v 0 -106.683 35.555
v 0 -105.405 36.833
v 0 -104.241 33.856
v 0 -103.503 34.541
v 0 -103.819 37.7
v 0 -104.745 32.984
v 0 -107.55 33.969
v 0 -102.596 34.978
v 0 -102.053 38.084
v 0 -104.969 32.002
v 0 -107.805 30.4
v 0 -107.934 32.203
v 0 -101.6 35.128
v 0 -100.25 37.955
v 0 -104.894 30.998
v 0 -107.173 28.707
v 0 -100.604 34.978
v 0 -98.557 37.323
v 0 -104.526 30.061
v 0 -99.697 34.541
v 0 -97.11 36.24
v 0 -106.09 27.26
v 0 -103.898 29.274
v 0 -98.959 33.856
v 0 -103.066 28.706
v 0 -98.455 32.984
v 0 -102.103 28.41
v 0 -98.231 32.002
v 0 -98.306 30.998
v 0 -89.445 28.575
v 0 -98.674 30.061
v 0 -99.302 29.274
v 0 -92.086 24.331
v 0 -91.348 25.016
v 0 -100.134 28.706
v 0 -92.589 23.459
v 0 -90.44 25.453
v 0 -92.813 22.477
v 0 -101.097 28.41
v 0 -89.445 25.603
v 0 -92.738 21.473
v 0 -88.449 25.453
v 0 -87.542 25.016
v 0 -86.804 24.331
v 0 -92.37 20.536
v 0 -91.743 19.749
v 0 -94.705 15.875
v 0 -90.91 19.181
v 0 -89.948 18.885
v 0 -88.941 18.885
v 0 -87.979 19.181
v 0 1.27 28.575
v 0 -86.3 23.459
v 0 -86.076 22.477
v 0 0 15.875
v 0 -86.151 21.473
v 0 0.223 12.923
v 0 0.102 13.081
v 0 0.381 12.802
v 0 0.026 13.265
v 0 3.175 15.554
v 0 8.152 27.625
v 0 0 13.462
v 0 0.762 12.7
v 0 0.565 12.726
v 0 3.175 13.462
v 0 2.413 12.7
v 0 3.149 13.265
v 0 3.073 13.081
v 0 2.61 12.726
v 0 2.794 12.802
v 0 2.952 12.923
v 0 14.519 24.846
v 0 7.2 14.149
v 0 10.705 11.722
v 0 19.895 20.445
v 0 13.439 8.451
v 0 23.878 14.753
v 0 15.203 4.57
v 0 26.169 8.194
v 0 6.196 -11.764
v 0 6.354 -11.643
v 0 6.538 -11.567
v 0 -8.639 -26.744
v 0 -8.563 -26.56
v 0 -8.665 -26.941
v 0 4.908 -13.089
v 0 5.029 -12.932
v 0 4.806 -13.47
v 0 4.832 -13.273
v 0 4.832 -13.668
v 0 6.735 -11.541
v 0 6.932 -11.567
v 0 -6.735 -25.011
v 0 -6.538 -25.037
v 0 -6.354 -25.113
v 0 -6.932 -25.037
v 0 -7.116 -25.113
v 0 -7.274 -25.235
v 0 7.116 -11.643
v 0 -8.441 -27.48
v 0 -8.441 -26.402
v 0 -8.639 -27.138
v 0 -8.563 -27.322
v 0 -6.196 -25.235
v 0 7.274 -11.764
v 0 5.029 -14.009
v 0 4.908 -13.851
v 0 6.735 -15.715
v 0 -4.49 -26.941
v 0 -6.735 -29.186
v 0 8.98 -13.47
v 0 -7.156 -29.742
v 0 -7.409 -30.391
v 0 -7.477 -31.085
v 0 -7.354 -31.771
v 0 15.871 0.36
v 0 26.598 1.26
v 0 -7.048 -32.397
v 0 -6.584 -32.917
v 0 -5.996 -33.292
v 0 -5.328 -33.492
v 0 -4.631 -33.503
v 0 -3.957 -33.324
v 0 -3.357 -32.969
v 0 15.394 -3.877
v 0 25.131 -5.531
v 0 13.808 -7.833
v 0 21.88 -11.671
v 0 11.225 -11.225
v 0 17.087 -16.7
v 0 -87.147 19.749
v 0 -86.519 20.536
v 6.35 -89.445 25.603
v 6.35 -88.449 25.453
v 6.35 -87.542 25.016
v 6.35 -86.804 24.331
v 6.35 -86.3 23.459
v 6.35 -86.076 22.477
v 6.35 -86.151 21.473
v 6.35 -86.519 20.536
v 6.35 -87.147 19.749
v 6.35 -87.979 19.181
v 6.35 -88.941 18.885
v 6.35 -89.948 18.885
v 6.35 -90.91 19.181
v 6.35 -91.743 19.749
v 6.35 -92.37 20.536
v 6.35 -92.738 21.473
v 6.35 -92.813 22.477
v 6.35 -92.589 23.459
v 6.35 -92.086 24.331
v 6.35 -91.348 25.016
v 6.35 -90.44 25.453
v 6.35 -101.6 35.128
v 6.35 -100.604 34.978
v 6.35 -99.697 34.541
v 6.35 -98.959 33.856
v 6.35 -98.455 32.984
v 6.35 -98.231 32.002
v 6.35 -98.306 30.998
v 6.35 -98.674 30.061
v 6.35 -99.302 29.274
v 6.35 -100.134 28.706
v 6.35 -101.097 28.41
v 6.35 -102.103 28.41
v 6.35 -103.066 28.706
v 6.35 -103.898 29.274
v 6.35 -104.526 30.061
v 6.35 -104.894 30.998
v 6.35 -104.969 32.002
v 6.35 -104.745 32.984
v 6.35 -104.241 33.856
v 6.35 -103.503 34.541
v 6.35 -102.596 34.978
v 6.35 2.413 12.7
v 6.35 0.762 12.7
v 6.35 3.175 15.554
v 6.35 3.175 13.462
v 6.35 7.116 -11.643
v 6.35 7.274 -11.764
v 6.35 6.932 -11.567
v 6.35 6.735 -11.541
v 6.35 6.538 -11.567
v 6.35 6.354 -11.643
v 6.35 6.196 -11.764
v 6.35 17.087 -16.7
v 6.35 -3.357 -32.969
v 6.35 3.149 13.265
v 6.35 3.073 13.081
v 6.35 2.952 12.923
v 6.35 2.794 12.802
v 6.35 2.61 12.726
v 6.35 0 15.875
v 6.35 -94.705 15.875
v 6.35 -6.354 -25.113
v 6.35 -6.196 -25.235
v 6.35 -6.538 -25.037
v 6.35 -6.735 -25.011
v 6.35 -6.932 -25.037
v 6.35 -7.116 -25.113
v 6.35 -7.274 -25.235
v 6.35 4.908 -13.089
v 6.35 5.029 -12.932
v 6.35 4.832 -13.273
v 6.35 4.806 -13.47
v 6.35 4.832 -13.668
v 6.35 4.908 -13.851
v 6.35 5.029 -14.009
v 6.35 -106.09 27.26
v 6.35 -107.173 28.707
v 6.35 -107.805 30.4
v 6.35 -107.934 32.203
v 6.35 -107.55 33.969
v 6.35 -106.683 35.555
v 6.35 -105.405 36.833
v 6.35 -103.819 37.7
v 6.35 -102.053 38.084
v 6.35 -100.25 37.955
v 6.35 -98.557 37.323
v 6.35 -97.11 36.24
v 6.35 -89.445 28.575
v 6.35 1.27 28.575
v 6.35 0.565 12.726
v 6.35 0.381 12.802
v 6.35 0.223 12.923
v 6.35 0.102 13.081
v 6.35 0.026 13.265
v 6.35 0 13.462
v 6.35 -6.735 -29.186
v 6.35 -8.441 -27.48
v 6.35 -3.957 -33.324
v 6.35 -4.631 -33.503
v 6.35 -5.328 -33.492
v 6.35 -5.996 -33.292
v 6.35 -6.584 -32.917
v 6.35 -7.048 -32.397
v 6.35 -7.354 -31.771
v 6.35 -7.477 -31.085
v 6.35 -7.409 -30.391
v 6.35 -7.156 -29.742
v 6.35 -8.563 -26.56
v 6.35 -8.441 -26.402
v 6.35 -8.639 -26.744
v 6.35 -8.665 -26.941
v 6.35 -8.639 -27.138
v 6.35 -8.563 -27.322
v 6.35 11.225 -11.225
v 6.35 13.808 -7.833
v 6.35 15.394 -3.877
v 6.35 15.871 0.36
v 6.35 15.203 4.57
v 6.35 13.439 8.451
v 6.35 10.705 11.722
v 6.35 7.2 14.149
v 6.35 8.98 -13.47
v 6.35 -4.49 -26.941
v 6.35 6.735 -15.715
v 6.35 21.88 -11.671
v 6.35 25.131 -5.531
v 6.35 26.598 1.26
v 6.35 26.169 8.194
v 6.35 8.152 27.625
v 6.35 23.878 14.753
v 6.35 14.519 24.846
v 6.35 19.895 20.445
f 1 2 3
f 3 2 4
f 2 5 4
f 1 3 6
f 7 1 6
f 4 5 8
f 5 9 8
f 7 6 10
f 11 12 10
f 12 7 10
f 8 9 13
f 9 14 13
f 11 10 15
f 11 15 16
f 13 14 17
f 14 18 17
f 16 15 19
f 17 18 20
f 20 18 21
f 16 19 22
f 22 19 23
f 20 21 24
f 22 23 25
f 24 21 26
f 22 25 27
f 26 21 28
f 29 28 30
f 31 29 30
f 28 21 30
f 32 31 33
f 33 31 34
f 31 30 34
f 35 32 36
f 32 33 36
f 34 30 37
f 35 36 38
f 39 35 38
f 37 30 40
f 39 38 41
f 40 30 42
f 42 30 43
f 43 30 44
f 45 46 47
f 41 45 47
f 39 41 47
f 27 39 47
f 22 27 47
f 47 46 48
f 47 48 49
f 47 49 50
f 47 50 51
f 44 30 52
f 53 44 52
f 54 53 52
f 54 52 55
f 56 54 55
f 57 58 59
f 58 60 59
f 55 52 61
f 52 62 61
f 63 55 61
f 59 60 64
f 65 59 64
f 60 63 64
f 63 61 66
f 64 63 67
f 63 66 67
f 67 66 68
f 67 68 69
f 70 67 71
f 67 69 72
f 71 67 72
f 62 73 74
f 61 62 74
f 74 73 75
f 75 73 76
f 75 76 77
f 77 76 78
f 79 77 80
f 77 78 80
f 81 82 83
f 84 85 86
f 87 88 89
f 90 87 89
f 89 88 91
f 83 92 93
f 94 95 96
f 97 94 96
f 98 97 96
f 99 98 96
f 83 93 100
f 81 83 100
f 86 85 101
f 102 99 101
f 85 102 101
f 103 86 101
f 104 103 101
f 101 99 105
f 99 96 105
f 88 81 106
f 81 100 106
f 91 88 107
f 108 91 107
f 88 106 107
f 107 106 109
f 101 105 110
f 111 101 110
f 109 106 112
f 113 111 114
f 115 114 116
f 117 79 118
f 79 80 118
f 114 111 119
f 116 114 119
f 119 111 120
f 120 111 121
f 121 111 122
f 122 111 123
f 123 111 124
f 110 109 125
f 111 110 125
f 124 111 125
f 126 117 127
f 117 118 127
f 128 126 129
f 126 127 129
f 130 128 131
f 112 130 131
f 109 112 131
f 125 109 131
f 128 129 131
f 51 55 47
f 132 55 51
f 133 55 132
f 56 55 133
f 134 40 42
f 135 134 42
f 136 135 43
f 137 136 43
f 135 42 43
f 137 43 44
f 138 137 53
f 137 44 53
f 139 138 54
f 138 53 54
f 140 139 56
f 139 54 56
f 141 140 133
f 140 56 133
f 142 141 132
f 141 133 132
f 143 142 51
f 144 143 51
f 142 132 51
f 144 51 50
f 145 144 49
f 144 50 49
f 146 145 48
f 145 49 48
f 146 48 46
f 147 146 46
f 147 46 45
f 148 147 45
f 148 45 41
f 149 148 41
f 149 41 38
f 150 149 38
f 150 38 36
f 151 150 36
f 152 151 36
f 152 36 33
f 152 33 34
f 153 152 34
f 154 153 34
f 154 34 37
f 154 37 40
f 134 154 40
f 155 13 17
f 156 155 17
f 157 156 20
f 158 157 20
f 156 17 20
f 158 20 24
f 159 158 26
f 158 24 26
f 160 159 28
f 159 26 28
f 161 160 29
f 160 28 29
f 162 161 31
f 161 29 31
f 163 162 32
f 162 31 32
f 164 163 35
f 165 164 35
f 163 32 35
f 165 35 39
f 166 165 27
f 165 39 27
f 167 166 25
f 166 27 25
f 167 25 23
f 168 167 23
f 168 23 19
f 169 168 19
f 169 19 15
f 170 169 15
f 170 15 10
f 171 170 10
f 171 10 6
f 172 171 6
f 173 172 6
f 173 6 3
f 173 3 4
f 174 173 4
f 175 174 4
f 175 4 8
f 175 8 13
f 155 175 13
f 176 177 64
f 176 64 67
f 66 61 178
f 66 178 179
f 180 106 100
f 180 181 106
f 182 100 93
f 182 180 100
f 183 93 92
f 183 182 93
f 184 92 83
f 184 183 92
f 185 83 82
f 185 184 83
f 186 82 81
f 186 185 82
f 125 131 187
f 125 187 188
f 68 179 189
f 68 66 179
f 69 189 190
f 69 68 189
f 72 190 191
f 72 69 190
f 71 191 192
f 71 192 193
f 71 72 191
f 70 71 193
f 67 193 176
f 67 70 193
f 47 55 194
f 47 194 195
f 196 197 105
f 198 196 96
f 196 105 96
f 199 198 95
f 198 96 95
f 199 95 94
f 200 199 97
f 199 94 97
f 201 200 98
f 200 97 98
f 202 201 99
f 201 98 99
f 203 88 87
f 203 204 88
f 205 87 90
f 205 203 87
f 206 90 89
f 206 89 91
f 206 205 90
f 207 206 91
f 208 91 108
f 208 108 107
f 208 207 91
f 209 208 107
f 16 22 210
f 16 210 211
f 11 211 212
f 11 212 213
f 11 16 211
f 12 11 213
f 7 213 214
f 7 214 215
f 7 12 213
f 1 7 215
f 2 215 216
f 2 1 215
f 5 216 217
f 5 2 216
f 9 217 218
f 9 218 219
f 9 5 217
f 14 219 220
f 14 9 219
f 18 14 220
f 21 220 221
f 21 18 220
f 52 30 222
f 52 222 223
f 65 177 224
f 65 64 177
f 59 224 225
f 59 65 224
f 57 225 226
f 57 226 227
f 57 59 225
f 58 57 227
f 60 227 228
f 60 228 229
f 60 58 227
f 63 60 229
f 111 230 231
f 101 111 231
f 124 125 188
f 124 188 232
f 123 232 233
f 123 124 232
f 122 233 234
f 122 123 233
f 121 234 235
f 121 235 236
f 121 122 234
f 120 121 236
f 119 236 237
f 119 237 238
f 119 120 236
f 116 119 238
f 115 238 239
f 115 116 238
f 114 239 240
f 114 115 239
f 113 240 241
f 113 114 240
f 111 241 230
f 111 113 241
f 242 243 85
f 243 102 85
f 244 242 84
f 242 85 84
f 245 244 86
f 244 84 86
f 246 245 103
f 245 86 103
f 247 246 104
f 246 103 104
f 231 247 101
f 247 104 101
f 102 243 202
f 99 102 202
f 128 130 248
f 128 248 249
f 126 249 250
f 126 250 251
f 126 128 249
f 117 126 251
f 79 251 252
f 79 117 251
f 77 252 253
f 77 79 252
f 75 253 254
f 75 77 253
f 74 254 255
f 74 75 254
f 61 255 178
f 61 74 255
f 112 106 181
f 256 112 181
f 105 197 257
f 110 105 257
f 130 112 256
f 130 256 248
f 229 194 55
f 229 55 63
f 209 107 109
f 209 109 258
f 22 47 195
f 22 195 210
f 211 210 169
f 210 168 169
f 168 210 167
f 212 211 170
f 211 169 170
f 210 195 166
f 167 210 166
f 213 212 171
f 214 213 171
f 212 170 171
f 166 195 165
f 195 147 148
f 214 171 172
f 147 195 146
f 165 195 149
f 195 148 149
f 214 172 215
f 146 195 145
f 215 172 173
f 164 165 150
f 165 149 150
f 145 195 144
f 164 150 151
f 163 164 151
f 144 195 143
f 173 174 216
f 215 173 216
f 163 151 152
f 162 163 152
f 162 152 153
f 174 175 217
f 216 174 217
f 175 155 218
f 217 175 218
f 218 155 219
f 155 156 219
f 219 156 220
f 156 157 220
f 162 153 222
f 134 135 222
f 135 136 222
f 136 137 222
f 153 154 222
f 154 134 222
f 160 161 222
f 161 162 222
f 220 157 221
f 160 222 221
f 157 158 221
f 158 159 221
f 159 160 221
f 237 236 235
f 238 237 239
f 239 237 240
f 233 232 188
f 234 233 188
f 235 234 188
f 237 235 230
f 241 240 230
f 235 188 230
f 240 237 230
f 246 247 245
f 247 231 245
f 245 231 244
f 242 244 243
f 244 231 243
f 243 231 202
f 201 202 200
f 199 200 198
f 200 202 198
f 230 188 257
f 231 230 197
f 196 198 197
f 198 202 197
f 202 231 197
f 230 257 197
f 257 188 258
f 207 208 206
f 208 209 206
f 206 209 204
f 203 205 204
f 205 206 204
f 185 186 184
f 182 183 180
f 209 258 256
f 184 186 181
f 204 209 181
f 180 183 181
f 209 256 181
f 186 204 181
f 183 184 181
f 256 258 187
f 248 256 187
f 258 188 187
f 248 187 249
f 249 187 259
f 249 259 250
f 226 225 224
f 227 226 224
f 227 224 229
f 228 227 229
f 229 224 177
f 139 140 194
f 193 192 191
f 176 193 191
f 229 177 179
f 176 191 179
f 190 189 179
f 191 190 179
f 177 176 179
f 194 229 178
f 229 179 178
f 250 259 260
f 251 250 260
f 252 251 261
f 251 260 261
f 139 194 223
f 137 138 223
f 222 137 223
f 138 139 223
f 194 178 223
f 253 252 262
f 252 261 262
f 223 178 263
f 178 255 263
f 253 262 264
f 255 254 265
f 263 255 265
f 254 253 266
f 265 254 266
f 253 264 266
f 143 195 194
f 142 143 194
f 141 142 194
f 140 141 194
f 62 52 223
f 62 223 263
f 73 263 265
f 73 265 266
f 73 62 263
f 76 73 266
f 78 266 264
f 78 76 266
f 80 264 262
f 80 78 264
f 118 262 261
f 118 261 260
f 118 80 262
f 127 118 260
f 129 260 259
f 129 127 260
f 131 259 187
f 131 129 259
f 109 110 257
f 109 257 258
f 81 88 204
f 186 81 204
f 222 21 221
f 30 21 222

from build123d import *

# Parameters (mm, degrees)
BOSS_EXTRUDE1_DEPTH         = 6.35
F_1_4_CLEARANCE_HOLE1_D     = 6.7564
F_1_4_CLEARANCE_HOLE1_DEPTH = 8.382
F_1_4_CLEARANCE_HOLE1_TIP   = 2.029827343
BOSS_EXTRUDE2_DEPTH         = 6.35
CRVPATTERN2_START           = 12.7
CRVPATTERN2_OUTLINE_W       = 6.35
CRVPATTERN2_OUTLINE_H       = 3.175
CRVPATTERN2_DEPTH           = 3.175
SKETCH5_W                   = 3.175
SKETCH5_H                   = 3.175
BOSS_EXTRUDE3_DEPTH         = 6.35
FILLET1_R                   = 0.762


# Read off the part's stored shape, not the designer's step: CrvPattern2
with BuildPart() as part:
    # Sketch1 → Boss-Extrude1 (new body)
    with BuildSketch(Plane(origin=(0, 0, 0), x_dir=(0, 0, -1), z_dir=(1, 0, 0))):
        with BuildLine():
            Line((-28.575, -89.444743879), (-28.575, 1.27))
            ThreePointArc((-28.575, 1.27), (-11.551976139, 25.24887134), (16.699509509, 17.086569533))
            Line((16.699509509, 17.086569533), (32.969334569, -3.357483913))
            ThreePointArc((32.969334569, -3.357483913), (32.673446977, -6.833926713), (29.185832393, -6.735192091))
            Line((29.185832393, -6.735192091), (11.225320151, 11.225320151))
            ThreePointArc((11.225320151, 11.225320151), (-6.075099489, 14.666587579), (-15.875, 0))
            Line((-15.875, 0), (-15.875, -94.705256121))
            Line((-15.875, -94.705256121), (-27.259871939, -106.090128061))
            ThreePointArc((-27.259871939, -106.090128061), (-36.240128061, -106.090128061), (-36.240128061, -97.109871939))
            Line((-36.240128061, -97.109871939), (-28.575, -89.444743879))
        make_face()
    extrude(amount=BOSS_EXTRUDE1_DEPTH)

    # 1/4 Clearance Hole1
    with Locations(Plane(origin=(6.35, 0, 0), x_dir=(0, 0, -1), z_dir=(1, 0, 0))):
        with Locations((-22.225, -89.444743879), (-31.75, -101.6)):
            Hole(F_1_4_CLEARANCE_HOLE1_D / 2, depth=F_1_4_CLEARANCE_HOLE1_DEPTH)
            with Locations((0, 0, -(F_1_4_CLEARANCE_HOLE1_DEPTH + F_1_4_CLEARANCE_HOLE1_TIP / 2))):  # 118° drill point
                Cone(0, F_1_4_CLEARANCE_HOLE1_D / 2, F_1_4_CLEARANCE_HOLE1_TIP, mode=Mode.SUBTRACT)

    # Sketch4 → Boss-Extrude2 (add)
    with BuildSketch(Plane(origin=(6.35, 0, 0), x_dir=(0, 0, -1), z_dir=(1, 0, 0))):
        Polygon((29.185832393, -6.735192091), (26.940768363, -8.980256121), (24.695704333, -6.735192091), (26.940768363, -4.490128061), align=None)
    extrude(amount=-BOSS_EXTRUDE2_DEPTH)

    # CrvPattern2 outline → CrvPattern2 (add)
    with BuildSketch(Plane(origin=(0, 0, 0), x_dir=(1, 0, 0), z_dir=(0, 0.7071067811865476, -0.7071067811865476)).offset(CRVPATTERN2_START)):
        with Locations((3.175, 4.7625)):
            Rectangle(CRVPATTERN2_OUTLINE_W, CRVPATTERN2_OUTLINE_H)
    extrude(amount=CRVPATTERN2_DEPTH)

    # Sketch5 → Boss-Extrude3 (add)
    with BuildSketch(Plane(origin=(6.35, 0, 0), x_dir=(0, 0, -1), z_dir=(1, 0, 0))):
        with Locations((-14.2875, 1.5875)):
            Rectangle(SKETCH5_W, SKETCH5_H)
    extrude(amount=-BOSS_EXTRUDE3_DEPTH)

    # Fillet1
    fillet1_edges = [part.edges().sort_by_distance(p)[0] for p in [
        (3.175, 4.490128061, -13.470384182),
        (3.175, 6.735192091, -11.225320151),
        (3.175, 3.175, 12.7),
        (3.175, 0, 12.7),
        (3.175, -8.980256121, -26.940768363),
        (3.175, -6.735192091, -24.695704333),
    ]]
    fillet(fillet1_edges, radius=FILLET1_R)


solid = part.part
